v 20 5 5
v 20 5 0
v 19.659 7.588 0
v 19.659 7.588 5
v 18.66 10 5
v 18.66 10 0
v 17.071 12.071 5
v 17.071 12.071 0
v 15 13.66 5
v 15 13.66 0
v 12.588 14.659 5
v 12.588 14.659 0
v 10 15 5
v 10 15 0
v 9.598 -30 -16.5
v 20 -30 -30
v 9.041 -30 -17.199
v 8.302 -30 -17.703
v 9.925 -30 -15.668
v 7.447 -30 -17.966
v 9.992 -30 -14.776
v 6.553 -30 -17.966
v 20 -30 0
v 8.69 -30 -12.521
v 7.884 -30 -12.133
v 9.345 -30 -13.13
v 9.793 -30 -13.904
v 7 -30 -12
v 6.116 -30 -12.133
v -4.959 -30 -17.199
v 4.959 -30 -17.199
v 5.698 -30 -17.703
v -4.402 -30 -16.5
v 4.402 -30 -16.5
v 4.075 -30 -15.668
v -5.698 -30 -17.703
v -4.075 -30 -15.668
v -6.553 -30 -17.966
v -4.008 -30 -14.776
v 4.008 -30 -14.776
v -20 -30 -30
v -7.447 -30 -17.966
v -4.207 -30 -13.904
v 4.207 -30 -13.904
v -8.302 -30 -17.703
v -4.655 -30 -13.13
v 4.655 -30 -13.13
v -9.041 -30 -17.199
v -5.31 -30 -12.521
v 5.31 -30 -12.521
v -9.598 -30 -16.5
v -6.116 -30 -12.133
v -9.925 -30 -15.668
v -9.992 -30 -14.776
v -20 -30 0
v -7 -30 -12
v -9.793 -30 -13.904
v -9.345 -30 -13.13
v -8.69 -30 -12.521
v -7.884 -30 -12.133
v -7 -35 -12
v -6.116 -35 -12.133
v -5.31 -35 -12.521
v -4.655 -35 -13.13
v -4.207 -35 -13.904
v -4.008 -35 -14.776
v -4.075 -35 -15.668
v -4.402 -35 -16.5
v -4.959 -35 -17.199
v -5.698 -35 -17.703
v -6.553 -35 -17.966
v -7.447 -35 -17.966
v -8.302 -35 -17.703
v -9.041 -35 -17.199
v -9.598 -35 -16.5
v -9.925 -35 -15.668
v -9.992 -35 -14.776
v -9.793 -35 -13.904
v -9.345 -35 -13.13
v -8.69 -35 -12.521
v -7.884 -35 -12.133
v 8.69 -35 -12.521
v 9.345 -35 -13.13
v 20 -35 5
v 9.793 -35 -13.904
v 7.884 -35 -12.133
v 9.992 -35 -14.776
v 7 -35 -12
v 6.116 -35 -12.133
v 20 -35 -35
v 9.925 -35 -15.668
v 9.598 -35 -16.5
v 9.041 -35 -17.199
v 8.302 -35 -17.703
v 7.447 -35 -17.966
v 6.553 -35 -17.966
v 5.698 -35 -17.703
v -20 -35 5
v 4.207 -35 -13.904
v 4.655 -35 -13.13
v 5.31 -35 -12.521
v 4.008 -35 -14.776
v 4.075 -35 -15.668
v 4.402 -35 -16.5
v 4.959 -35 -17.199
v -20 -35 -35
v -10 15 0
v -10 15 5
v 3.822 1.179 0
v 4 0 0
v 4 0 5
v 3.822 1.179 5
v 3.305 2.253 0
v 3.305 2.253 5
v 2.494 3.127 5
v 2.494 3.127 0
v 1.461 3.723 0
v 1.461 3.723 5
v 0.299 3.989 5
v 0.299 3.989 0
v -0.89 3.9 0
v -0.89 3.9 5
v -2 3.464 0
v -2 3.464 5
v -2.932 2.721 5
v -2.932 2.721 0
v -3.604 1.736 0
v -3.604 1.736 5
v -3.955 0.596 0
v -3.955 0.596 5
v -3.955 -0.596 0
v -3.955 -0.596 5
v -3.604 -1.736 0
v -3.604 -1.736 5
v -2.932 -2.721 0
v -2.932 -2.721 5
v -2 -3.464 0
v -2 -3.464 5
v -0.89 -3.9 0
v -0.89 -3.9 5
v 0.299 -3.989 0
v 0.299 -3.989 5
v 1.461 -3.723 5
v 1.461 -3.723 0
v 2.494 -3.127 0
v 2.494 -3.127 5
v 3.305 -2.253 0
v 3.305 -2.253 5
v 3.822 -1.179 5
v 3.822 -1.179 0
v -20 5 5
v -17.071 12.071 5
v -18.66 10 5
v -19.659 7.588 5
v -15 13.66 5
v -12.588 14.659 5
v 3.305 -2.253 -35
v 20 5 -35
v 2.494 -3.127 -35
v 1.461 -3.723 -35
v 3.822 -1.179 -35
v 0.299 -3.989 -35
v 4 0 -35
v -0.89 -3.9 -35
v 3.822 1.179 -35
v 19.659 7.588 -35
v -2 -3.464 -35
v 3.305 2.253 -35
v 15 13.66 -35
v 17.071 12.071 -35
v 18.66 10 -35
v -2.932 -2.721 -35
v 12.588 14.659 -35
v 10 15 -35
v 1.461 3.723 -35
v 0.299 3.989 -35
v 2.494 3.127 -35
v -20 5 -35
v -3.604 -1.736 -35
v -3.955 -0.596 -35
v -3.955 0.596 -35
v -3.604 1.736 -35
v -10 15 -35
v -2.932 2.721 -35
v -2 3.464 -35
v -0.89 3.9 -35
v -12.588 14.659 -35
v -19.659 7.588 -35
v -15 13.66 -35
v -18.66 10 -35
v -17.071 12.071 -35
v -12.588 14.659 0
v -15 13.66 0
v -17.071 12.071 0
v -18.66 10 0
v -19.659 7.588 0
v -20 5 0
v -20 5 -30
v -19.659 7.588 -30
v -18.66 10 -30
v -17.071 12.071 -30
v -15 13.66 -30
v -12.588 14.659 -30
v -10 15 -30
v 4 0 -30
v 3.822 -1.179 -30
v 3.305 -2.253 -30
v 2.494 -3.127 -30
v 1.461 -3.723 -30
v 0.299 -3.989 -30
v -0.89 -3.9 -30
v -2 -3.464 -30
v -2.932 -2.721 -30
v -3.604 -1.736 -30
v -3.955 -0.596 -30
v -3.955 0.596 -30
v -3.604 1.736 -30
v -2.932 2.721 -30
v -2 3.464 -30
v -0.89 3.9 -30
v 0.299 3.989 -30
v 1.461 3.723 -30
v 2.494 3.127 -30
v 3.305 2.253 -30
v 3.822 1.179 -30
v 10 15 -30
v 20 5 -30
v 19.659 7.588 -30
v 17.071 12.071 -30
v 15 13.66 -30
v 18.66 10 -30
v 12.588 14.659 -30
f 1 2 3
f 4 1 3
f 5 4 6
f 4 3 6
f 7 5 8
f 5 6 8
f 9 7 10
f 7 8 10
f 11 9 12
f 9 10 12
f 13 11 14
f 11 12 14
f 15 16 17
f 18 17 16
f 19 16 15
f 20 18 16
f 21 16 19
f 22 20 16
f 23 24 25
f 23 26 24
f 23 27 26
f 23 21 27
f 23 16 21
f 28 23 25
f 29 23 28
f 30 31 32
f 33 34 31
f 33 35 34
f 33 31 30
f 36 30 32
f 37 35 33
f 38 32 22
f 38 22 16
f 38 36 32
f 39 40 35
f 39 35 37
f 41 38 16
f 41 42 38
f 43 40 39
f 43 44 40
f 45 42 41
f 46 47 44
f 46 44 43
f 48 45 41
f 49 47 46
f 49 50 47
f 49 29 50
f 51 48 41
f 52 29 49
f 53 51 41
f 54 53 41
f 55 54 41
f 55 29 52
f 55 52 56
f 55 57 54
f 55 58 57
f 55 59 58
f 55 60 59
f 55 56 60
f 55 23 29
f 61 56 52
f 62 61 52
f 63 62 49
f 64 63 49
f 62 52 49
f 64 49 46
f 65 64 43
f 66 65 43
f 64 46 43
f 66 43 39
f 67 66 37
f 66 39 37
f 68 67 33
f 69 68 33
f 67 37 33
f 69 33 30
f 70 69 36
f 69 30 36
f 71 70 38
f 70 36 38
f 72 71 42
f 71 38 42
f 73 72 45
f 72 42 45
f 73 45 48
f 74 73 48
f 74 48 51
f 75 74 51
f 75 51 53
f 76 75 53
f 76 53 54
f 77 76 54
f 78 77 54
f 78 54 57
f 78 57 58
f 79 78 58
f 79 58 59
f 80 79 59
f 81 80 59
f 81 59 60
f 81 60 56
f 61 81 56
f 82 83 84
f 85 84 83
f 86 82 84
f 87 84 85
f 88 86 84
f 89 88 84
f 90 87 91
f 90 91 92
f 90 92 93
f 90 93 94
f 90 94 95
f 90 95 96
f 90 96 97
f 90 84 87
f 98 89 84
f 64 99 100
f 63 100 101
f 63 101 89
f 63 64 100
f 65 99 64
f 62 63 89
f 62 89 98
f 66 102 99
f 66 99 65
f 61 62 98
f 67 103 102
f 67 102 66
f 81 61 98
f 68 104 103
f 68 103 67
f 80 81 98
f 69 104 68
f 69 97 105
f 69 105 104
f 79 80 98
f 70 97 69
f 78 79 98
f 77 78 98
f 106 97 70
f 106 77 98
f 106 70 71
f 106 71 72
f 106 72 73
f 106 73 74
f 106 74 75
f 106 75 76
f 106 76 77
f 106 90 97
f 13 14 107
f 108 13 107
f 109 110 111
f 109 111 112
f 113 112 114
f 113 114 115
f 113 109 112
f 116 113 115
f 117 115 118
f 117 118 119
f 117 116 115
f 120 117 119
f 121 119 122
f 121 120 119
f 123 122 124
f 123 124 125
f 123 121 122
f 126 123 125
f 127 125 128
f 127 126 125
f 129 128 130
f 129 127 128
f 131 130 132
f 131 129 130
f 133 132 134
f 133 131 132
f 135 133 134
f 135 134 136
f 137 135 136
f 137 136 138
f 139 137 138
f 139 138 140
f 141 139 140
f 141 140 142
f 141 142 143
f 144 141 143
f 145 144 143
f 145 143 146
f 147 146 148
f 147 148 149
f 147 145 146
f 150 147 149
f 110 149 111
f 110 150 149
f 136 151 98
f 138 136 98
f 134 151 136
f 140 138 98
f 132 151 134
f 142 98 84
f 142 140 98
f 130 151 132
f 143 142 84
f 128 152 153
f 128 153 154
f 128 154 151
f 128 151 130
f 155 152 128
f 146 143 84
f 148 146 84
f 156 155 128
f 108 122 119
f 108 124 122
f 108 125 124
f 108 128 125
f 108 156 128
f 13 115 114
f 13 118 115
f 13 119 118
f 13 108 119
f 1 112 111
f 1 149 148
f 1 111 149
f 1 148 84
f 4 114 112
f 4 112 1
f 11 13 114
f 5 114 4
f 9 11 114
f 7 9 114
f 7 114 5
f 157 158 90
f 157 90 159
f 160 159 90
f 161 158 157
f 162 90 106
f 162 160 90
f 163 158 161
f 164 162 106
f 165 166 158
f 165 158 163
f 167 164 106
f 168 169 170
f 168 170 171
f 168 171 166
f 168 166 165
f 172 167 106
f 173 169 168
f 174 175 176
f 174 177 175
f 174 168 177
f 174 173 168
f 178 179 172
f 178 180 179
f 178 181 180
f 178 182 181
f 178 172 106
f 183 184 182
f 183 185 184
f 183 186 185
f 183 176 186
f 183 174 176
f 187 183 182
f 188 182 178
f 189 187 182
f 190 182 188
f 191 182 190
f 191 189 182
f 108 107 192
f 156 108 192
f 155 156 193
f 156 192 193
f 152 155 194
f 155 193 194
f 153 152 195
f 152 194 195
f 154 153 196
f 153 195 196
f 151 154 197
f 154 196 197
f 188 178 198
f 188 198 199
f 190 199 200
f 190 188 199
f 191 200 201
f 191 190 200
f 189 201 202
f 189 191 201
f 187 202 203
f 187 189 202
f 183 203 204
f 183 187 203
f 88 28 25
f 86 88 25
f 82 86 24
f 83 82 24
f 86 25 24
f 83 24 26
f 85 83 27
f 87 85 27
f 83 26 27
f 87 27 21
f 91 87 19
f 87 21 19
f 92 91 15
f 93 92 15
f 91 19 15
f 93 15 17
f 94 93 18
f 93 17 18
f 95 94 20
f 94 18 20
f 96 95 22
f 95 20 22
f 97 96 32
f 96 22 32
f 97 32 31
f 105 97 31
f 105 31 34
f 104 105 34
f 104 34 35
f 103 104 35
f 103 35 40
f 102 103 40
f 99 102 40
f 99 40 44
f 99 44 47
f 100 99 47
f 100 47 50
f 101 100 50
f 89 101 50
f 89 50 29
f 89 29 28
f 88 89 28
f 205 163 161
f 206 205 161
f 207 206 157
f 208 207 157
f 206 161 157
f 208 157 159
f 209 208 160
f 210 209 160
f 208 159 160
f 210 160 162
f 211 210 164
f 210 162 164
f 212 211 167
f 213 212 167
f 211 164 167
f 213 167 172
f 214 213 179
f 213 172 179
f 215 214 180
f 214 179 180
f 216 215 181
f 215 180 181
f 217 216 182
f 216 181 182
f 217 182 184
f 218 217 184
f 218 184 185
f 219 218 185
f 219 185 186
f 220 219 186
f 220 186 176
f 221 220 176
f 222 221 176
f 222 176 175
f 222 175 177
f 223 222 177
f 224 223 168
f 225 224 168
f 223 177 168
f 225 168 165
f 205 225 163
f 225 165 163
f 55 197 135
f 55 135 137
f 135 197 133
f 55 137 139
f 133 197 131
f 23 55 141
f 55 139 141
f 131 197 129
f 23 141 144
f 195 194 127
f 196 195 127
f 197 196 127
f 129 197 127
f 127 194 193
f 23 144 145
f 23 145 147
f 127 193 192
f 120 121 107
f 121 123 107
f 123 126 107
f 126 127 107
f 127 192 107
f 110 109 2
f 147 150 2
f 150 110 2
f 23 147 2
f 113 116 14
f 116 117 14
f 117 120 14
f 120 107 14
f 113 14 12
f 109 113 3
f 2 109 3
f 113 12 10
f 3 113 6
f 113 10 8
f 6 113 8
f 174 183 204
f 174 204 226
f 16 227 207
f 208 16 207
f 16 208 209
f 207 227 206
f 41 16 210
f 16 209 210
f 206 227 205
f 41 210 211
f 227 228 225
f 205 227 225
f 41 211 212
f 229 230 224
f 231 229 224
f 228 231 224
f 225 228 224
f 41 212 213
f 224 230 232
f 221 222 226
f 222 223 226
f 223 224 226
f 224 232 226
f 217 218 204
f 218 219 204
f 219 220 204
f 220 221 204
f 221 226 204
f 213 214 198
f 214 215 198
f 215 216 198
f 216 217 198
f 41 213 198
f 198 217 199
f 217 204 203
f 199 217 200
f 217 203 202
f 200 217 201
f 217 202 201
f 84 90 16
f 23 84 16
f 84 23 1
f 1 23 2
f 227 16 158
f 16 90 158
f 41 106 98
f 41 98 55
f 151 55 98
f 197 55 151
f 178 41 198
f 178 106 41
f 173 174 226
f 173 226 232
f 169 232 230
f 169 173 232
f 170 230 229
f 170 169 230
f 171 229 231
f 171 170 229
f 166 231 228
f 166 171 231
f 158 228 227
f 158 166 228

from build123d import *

# Parameters (mm, degrees)
SKETCH1_R           = 4
BOSS_EXTRUDE4_DEPTH = 5
SKETCH4_W           = 40
SKETCH4_H           = 5
BOSS_EXTRUDE5_DEPTH = 30
BOSS_EXTRUDE6_START = 5
SKETCH5_W           = 40
SKETCH5_H           = 5
SKETCH5_R           = 4
BOSS_EXTRUDE6_DEPTH = 5
SKETCH7_R           = 3
CUT_EXTRUDE1_DEPTH  = 15


with BuildPart() as part:
    # Sketch1 → Boss-Extrude4 (new body)
    with BuildSketch(Plane.XY):
        with BuildLine():
            Line((-20, -35), (20, -35))
            Line((20, -35), (20, 5))
            ThreePointArc((20, 5), (17.071067812, 12.071067812), (10, 15))
            Line((10, 15), (-10, 15))
            ThreePointArc((-10, 15), (-17.071067812, 12.071067812), (-20, 5))
            Line((-20, 5), (-20, -35))
        make_face()
        Circle(SKETCH1_R, mode=Mode.SUBTRACT)
    extrude(amount=BOSS_EXTRUDE4_DEPTH)

    # Sketch4 → Boss-Extrude5 (add)
    with BuildSketch(Plane(origin=(0, 0, 0), x_dir=(-1, 0, 0), z_dir=(0, 0, -1))):
        with Locations((0, -32.5)):
            Rectangle(SKETCH4_W, SKETCH4_H)
    extrude(amount=BOSS_EXTRUDE5_DEPTH)

    # Sketch5 → Boss-Extrude6 (add)
    # profile 1 of 2: a face of its own
    with BuildSketch(Plane(origin=(0, 0, -30), x_dir=(-1, 0, 0), z_dir=(0, 0, -1)).offset(BOSS_EXTRUDE6_START)):
        with Locations((0, -32.5)):
            Rectangle(SKETCH5_W, SKETCH5_H)
    # profile 2 of 2: a face of its own
    with BuildSketch(Plane(origin=(0, 0, -30), x_dir=(-1, 0, 0), z_dir=(0, 0, -1)).offset(BOSS_EXTRUDE6_START)):
        with BuildLine():
            Line((-20, 0), (-20, -30))
            Line((-20, -30), (20, -30))
            Line((20, -30), (20, 0))
            Line((20, 0), (20, 5))
            ThreePointArc((20, 5), (17.071067812, 12.071067812), (10, 15))
            Line((10, 15), (-10, 15))
            ThreePointArc((-10, 15), (-17.071067812, 12.071067812), (-20, 5))
            Line((-20, 5), (-20, 0))
        make_face()
        with Locations(Location((0, 0, 0), (0, 0, 180))):
            Circle(SKETCH5_R, mode=Mode.SUBTRACT)
    extrude(amount=-BOSS_EXTRUDE6_DEPTH)

    # Sketch7 → Cut-Extrude1 (cut)
    with BuildSketch(Plane(origin=(0, -30, 0), x_dir=(1, 0, 0), z_dir=(0, 1, 0))):
        with Locations(Location((-7, 15, 0), (0, 0, 270))):
            Circle(SKETCH7_R)
        with Locations(Location((7, 15, 0), (0, 0, 270))):
            Circle(SKETCH7_R)
    extrude(amount=-CUT_EXTRUDE1_DEPTH, mode=Mode.SUBTRACT)


solid = part.part
